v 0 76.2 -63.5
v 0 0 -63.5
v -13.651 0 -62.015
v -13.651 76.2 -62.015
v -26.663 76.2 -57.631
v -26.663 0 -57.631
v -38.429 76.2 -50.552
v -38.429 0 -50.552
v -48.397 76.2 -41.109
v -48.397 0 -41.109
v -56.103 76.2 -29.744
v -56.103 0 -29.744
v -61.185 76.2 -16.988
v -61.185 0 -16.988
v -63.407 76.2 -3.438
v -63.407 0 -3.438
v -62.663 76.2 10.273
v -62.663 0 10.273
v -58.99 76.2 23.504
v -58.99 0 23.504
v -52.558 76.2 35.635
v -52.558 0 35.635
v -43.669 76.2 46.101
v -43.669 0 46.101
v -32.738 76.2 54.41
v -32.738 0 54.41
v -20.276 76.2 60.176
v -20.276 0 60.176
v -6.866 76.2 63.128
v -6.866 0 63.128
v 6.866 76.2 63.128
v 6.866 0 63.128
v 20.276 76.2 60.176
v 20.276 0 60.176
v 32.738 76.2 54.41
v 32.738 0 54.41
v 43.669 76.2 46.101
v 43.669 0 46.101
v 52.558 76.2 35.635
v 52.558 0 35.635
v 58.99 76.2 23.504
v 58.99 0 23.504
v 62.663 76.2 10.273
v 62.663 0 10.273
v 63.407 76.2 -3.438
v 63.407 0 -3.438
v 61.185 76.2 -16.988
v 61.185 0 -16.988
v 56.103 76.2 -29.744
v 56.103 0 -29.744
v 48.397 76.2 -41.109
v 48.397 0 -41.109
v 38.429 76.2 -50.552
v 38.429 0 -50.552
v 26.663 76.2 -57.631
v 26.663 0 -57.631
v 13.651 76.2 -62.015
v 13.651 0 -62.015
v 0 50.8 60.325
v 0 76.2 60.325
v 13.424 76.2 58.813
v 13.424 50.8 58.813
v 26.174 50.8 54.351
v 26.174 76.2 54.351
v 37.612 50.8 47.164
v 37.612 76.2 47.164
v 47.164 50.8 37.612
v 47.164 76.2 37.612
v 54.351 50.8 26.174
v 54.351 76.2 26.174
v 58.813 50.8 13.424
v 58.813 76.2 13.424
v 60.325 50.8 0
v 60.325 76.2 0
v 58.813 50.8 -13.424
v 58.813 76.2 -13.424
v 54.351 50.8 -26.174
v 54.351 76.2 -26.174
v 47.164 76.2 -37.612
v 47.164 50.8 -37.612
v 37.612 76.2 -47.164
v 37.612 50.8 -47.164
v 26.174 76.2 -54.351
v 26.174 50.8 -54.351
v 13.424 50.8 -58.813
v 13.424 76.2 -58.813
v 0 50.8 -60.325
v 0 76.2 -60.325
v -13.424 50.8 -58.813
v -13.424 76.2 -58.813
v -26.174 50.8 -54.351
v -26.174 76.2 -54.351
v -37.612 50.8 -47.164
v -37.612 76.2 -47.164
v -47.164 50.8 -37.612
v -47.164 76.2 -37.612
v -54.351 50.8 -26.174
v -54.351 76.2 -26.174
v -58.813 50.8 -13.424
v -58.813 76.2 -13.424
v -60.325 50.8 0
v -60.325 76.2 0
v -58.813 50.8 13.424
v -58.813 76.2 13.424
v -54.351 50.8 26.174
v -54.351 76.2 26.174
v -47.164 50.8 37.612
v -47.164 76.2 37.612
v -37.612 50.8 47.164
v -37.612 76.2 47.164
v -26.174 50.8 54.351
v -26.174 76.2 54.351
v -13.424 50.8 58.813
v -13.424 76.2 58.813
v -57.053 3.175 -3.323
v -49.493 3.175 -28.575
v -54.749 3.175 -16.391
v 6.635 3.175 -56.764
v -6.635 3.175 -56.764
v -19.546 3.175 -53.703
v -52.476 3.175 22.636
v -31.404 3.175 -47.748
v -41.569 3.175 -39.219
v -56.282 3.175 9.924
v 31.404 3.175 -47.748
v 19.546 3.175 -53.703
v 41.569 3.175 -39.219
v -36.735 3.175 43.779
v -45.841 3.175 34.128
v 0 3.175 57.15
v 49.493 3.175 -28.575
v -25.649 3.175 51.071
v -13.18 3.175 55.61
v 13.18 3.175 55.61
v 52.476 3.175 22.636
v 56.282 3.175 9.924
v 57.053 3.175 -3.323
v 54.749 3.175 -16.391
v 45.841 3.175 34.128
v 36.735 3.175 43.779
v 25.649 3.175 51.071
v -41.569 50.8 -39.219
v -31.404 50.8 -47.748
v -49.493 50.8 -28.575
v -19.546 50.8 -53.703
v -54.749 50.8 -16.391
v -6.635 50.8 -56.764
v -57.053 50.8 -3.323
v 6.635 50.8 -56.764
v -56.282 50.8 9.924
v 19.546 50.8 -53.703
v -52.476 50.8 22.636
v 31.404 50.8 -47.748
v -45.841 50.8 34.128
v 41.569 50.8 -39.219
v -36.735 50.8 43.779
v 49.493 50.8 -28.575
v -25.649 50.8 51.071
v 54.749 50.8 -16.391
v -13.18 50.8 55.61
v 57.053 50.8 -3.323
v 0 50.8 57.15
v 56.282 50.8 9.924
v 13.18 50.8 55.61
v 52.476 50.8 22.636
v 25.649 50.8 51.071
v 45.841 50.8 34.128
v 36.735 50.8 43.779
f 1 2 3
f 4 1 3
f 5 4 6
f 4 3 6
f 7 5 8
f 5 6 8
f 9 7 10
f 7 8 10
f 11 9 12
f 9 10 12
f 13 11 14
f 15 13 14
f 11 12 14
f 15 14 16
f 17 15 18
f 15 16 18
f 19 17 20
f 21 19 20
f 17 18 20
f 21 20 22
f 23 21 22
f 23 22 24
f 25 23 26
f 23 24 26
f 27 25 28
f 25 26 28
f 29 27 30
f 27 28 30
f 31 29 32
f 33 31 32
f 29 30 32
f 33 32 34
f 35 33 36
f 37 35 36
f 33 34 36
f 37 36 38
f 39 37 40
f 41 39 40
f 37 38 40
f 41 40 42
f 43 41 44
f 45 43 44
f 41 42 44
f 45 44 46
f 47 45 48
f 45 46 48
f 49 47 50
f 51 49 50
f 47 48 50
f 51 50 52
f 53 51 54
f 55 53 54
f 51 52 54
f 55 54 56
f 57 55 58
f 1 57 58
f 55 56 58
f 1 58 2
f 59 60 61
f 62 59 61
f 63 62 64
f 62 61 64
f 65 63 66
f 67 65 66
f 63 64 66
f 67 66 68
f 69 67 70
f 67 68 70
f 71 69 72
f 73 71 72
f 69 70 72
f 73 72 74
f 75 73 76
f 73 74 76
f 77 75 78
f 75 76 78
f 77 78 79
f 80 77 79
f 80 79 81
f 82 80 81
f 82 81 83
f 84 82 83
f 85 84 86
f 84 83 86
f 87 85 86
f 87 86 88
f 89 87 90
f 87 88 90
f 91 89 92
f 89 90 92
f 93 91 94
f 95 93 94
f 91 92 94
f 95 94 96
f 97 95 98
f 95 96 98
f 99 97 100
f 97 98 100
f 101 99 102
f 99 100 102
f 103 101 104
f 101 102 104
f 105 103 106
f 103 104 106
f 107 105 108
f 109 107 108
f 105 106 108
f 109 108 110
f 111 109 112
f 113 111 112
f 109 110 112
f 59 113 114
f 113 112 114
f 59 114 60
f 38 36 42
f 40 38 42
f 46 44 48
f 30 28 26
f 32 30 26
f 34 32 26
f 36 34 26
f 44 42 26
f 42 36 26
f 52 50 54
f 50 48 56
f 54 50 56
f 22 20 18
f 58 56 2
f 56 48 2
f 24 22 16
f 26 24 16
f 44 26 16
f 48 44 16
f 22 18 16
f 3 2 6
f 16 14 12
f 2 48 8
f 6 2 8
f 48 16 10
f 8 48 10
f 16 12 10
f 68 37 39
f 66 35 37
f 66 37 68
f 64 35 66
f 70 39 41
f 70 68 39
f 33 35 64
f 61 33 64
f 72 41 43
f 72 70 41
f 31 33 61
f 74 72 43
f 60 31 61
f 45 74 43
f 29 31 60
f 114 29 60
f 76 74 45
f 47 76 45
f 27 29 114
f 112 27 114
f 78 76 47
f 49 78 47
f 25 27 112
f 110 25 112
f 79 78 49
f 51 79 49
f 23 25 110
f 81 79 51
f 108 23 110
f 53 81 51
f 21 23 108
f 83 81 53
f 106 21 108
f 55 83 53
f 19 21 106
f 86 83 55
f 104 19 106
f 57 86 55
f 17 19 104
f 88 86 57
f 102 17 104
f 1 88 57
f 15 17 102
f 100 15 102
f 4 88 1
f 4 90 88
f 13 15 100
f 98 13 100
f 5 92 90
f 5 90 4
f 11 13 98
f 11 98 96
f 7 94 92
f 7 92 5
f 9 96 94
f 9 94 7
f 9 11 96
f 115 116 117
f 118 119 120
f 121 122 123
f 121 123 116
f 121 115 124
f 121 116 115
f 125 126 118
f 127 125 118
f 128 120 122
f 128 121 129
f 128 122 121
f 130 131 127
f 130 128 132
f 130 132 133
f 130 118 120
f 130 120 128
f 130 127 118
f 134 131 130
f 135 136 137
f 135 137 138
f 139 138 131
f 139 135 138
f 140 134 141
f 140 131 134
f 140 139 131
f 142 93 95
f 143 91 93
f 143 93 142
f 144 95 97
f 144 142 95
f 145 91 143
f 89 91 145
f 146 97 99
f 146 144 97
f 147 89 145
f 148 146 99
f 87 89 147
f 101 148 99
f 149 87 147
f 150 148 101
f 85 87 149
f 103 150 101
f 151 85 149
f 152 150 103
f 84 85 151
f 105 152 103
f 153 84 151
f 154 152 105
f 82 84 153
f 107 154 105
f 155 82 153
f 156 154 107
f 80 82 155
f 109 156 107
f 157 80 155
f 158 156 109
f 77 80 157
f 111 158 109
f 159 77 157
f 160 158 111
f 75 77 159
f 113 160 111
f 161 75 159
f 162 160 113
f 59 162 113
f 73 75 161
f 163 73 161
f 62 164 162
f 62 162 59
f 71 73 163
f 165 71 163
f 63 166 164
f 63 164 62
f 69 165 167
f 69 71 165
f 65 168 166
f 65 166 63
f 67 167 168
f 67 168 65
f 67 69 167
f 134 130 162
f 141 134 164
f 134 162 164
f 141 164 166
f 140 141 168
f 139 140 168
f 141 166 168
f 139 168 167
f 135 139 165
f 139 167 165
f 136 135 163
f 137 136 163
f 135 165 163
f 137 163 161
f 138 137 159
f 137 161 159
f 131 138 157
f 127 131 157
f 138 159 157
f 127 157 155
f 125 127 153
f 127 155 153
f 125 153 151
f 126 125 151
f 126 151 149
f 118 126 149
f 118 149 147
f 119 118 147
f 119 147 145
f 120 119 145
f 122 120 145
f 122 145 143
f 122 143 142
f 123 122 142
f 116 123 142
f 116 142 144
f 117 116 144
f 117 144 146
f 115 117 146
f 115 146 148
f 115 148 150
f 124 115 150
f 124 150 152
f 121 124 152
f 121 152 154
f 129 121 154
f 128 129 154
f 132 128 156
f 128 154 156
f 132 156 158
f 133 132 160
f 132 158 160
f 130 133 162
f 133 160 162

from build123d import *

# Parameters (mm, degrees)
SKETCH1_R           = 63.5
BOSS_EXTRUDE1_DEPTH = 76.2
SKETCH2_R           = 57.15
CUT_EXTRUDE1_DEPTH  = 73.025
SKETCH3_R           = 60.325
CUT_EXTRUDE2_DEPTH  = 25.4


with BuildPart() as part:
    # Sketch1 → Boss-Extrude1 (new body)
    with BuildSketch(Plane(origin=(0, 0, 0), x_dir=(1, 0, 0), z_dir=(0, 1, 0))):
        with Locations(Location((0, 0, 0), (0, 0, 90))):
            Circle(SKETCH1_R)
    extrude(amount=BOSS_EXTRUDE1_DEPTH)

    # Sketch2 → Cut-Extrude1 (cut)
    with BuildSketch(Plane(origin=(0, 76.2, 0), x_dir=(1, 0, 0), z_dir=(0, 1, 0))):
        with Locations(Location((0, 0, 0), (0, 0, 270))):
            Circle(SKETCH2_R)
    extrude(amount=-CUT_EXTRUDE1_DEPTH, mode=Mode.SUBTRACT)

    # Sketch3 → Cut-Extrude2 (cut)
    with BuildSketch(Plane(origin=(0, 76.2, 0), x_dir=(1, 0, 0), z_dir=(0, 1, 0))):
        with Locations(Location((0, 0, 0), (0, 0, 270))):
            Circle(SKETCH3_R)
    extrude(amount=-CUT_EXTRUDE2_DEPTH, mode=Mode.SUBTRACT)


solid = part.part
